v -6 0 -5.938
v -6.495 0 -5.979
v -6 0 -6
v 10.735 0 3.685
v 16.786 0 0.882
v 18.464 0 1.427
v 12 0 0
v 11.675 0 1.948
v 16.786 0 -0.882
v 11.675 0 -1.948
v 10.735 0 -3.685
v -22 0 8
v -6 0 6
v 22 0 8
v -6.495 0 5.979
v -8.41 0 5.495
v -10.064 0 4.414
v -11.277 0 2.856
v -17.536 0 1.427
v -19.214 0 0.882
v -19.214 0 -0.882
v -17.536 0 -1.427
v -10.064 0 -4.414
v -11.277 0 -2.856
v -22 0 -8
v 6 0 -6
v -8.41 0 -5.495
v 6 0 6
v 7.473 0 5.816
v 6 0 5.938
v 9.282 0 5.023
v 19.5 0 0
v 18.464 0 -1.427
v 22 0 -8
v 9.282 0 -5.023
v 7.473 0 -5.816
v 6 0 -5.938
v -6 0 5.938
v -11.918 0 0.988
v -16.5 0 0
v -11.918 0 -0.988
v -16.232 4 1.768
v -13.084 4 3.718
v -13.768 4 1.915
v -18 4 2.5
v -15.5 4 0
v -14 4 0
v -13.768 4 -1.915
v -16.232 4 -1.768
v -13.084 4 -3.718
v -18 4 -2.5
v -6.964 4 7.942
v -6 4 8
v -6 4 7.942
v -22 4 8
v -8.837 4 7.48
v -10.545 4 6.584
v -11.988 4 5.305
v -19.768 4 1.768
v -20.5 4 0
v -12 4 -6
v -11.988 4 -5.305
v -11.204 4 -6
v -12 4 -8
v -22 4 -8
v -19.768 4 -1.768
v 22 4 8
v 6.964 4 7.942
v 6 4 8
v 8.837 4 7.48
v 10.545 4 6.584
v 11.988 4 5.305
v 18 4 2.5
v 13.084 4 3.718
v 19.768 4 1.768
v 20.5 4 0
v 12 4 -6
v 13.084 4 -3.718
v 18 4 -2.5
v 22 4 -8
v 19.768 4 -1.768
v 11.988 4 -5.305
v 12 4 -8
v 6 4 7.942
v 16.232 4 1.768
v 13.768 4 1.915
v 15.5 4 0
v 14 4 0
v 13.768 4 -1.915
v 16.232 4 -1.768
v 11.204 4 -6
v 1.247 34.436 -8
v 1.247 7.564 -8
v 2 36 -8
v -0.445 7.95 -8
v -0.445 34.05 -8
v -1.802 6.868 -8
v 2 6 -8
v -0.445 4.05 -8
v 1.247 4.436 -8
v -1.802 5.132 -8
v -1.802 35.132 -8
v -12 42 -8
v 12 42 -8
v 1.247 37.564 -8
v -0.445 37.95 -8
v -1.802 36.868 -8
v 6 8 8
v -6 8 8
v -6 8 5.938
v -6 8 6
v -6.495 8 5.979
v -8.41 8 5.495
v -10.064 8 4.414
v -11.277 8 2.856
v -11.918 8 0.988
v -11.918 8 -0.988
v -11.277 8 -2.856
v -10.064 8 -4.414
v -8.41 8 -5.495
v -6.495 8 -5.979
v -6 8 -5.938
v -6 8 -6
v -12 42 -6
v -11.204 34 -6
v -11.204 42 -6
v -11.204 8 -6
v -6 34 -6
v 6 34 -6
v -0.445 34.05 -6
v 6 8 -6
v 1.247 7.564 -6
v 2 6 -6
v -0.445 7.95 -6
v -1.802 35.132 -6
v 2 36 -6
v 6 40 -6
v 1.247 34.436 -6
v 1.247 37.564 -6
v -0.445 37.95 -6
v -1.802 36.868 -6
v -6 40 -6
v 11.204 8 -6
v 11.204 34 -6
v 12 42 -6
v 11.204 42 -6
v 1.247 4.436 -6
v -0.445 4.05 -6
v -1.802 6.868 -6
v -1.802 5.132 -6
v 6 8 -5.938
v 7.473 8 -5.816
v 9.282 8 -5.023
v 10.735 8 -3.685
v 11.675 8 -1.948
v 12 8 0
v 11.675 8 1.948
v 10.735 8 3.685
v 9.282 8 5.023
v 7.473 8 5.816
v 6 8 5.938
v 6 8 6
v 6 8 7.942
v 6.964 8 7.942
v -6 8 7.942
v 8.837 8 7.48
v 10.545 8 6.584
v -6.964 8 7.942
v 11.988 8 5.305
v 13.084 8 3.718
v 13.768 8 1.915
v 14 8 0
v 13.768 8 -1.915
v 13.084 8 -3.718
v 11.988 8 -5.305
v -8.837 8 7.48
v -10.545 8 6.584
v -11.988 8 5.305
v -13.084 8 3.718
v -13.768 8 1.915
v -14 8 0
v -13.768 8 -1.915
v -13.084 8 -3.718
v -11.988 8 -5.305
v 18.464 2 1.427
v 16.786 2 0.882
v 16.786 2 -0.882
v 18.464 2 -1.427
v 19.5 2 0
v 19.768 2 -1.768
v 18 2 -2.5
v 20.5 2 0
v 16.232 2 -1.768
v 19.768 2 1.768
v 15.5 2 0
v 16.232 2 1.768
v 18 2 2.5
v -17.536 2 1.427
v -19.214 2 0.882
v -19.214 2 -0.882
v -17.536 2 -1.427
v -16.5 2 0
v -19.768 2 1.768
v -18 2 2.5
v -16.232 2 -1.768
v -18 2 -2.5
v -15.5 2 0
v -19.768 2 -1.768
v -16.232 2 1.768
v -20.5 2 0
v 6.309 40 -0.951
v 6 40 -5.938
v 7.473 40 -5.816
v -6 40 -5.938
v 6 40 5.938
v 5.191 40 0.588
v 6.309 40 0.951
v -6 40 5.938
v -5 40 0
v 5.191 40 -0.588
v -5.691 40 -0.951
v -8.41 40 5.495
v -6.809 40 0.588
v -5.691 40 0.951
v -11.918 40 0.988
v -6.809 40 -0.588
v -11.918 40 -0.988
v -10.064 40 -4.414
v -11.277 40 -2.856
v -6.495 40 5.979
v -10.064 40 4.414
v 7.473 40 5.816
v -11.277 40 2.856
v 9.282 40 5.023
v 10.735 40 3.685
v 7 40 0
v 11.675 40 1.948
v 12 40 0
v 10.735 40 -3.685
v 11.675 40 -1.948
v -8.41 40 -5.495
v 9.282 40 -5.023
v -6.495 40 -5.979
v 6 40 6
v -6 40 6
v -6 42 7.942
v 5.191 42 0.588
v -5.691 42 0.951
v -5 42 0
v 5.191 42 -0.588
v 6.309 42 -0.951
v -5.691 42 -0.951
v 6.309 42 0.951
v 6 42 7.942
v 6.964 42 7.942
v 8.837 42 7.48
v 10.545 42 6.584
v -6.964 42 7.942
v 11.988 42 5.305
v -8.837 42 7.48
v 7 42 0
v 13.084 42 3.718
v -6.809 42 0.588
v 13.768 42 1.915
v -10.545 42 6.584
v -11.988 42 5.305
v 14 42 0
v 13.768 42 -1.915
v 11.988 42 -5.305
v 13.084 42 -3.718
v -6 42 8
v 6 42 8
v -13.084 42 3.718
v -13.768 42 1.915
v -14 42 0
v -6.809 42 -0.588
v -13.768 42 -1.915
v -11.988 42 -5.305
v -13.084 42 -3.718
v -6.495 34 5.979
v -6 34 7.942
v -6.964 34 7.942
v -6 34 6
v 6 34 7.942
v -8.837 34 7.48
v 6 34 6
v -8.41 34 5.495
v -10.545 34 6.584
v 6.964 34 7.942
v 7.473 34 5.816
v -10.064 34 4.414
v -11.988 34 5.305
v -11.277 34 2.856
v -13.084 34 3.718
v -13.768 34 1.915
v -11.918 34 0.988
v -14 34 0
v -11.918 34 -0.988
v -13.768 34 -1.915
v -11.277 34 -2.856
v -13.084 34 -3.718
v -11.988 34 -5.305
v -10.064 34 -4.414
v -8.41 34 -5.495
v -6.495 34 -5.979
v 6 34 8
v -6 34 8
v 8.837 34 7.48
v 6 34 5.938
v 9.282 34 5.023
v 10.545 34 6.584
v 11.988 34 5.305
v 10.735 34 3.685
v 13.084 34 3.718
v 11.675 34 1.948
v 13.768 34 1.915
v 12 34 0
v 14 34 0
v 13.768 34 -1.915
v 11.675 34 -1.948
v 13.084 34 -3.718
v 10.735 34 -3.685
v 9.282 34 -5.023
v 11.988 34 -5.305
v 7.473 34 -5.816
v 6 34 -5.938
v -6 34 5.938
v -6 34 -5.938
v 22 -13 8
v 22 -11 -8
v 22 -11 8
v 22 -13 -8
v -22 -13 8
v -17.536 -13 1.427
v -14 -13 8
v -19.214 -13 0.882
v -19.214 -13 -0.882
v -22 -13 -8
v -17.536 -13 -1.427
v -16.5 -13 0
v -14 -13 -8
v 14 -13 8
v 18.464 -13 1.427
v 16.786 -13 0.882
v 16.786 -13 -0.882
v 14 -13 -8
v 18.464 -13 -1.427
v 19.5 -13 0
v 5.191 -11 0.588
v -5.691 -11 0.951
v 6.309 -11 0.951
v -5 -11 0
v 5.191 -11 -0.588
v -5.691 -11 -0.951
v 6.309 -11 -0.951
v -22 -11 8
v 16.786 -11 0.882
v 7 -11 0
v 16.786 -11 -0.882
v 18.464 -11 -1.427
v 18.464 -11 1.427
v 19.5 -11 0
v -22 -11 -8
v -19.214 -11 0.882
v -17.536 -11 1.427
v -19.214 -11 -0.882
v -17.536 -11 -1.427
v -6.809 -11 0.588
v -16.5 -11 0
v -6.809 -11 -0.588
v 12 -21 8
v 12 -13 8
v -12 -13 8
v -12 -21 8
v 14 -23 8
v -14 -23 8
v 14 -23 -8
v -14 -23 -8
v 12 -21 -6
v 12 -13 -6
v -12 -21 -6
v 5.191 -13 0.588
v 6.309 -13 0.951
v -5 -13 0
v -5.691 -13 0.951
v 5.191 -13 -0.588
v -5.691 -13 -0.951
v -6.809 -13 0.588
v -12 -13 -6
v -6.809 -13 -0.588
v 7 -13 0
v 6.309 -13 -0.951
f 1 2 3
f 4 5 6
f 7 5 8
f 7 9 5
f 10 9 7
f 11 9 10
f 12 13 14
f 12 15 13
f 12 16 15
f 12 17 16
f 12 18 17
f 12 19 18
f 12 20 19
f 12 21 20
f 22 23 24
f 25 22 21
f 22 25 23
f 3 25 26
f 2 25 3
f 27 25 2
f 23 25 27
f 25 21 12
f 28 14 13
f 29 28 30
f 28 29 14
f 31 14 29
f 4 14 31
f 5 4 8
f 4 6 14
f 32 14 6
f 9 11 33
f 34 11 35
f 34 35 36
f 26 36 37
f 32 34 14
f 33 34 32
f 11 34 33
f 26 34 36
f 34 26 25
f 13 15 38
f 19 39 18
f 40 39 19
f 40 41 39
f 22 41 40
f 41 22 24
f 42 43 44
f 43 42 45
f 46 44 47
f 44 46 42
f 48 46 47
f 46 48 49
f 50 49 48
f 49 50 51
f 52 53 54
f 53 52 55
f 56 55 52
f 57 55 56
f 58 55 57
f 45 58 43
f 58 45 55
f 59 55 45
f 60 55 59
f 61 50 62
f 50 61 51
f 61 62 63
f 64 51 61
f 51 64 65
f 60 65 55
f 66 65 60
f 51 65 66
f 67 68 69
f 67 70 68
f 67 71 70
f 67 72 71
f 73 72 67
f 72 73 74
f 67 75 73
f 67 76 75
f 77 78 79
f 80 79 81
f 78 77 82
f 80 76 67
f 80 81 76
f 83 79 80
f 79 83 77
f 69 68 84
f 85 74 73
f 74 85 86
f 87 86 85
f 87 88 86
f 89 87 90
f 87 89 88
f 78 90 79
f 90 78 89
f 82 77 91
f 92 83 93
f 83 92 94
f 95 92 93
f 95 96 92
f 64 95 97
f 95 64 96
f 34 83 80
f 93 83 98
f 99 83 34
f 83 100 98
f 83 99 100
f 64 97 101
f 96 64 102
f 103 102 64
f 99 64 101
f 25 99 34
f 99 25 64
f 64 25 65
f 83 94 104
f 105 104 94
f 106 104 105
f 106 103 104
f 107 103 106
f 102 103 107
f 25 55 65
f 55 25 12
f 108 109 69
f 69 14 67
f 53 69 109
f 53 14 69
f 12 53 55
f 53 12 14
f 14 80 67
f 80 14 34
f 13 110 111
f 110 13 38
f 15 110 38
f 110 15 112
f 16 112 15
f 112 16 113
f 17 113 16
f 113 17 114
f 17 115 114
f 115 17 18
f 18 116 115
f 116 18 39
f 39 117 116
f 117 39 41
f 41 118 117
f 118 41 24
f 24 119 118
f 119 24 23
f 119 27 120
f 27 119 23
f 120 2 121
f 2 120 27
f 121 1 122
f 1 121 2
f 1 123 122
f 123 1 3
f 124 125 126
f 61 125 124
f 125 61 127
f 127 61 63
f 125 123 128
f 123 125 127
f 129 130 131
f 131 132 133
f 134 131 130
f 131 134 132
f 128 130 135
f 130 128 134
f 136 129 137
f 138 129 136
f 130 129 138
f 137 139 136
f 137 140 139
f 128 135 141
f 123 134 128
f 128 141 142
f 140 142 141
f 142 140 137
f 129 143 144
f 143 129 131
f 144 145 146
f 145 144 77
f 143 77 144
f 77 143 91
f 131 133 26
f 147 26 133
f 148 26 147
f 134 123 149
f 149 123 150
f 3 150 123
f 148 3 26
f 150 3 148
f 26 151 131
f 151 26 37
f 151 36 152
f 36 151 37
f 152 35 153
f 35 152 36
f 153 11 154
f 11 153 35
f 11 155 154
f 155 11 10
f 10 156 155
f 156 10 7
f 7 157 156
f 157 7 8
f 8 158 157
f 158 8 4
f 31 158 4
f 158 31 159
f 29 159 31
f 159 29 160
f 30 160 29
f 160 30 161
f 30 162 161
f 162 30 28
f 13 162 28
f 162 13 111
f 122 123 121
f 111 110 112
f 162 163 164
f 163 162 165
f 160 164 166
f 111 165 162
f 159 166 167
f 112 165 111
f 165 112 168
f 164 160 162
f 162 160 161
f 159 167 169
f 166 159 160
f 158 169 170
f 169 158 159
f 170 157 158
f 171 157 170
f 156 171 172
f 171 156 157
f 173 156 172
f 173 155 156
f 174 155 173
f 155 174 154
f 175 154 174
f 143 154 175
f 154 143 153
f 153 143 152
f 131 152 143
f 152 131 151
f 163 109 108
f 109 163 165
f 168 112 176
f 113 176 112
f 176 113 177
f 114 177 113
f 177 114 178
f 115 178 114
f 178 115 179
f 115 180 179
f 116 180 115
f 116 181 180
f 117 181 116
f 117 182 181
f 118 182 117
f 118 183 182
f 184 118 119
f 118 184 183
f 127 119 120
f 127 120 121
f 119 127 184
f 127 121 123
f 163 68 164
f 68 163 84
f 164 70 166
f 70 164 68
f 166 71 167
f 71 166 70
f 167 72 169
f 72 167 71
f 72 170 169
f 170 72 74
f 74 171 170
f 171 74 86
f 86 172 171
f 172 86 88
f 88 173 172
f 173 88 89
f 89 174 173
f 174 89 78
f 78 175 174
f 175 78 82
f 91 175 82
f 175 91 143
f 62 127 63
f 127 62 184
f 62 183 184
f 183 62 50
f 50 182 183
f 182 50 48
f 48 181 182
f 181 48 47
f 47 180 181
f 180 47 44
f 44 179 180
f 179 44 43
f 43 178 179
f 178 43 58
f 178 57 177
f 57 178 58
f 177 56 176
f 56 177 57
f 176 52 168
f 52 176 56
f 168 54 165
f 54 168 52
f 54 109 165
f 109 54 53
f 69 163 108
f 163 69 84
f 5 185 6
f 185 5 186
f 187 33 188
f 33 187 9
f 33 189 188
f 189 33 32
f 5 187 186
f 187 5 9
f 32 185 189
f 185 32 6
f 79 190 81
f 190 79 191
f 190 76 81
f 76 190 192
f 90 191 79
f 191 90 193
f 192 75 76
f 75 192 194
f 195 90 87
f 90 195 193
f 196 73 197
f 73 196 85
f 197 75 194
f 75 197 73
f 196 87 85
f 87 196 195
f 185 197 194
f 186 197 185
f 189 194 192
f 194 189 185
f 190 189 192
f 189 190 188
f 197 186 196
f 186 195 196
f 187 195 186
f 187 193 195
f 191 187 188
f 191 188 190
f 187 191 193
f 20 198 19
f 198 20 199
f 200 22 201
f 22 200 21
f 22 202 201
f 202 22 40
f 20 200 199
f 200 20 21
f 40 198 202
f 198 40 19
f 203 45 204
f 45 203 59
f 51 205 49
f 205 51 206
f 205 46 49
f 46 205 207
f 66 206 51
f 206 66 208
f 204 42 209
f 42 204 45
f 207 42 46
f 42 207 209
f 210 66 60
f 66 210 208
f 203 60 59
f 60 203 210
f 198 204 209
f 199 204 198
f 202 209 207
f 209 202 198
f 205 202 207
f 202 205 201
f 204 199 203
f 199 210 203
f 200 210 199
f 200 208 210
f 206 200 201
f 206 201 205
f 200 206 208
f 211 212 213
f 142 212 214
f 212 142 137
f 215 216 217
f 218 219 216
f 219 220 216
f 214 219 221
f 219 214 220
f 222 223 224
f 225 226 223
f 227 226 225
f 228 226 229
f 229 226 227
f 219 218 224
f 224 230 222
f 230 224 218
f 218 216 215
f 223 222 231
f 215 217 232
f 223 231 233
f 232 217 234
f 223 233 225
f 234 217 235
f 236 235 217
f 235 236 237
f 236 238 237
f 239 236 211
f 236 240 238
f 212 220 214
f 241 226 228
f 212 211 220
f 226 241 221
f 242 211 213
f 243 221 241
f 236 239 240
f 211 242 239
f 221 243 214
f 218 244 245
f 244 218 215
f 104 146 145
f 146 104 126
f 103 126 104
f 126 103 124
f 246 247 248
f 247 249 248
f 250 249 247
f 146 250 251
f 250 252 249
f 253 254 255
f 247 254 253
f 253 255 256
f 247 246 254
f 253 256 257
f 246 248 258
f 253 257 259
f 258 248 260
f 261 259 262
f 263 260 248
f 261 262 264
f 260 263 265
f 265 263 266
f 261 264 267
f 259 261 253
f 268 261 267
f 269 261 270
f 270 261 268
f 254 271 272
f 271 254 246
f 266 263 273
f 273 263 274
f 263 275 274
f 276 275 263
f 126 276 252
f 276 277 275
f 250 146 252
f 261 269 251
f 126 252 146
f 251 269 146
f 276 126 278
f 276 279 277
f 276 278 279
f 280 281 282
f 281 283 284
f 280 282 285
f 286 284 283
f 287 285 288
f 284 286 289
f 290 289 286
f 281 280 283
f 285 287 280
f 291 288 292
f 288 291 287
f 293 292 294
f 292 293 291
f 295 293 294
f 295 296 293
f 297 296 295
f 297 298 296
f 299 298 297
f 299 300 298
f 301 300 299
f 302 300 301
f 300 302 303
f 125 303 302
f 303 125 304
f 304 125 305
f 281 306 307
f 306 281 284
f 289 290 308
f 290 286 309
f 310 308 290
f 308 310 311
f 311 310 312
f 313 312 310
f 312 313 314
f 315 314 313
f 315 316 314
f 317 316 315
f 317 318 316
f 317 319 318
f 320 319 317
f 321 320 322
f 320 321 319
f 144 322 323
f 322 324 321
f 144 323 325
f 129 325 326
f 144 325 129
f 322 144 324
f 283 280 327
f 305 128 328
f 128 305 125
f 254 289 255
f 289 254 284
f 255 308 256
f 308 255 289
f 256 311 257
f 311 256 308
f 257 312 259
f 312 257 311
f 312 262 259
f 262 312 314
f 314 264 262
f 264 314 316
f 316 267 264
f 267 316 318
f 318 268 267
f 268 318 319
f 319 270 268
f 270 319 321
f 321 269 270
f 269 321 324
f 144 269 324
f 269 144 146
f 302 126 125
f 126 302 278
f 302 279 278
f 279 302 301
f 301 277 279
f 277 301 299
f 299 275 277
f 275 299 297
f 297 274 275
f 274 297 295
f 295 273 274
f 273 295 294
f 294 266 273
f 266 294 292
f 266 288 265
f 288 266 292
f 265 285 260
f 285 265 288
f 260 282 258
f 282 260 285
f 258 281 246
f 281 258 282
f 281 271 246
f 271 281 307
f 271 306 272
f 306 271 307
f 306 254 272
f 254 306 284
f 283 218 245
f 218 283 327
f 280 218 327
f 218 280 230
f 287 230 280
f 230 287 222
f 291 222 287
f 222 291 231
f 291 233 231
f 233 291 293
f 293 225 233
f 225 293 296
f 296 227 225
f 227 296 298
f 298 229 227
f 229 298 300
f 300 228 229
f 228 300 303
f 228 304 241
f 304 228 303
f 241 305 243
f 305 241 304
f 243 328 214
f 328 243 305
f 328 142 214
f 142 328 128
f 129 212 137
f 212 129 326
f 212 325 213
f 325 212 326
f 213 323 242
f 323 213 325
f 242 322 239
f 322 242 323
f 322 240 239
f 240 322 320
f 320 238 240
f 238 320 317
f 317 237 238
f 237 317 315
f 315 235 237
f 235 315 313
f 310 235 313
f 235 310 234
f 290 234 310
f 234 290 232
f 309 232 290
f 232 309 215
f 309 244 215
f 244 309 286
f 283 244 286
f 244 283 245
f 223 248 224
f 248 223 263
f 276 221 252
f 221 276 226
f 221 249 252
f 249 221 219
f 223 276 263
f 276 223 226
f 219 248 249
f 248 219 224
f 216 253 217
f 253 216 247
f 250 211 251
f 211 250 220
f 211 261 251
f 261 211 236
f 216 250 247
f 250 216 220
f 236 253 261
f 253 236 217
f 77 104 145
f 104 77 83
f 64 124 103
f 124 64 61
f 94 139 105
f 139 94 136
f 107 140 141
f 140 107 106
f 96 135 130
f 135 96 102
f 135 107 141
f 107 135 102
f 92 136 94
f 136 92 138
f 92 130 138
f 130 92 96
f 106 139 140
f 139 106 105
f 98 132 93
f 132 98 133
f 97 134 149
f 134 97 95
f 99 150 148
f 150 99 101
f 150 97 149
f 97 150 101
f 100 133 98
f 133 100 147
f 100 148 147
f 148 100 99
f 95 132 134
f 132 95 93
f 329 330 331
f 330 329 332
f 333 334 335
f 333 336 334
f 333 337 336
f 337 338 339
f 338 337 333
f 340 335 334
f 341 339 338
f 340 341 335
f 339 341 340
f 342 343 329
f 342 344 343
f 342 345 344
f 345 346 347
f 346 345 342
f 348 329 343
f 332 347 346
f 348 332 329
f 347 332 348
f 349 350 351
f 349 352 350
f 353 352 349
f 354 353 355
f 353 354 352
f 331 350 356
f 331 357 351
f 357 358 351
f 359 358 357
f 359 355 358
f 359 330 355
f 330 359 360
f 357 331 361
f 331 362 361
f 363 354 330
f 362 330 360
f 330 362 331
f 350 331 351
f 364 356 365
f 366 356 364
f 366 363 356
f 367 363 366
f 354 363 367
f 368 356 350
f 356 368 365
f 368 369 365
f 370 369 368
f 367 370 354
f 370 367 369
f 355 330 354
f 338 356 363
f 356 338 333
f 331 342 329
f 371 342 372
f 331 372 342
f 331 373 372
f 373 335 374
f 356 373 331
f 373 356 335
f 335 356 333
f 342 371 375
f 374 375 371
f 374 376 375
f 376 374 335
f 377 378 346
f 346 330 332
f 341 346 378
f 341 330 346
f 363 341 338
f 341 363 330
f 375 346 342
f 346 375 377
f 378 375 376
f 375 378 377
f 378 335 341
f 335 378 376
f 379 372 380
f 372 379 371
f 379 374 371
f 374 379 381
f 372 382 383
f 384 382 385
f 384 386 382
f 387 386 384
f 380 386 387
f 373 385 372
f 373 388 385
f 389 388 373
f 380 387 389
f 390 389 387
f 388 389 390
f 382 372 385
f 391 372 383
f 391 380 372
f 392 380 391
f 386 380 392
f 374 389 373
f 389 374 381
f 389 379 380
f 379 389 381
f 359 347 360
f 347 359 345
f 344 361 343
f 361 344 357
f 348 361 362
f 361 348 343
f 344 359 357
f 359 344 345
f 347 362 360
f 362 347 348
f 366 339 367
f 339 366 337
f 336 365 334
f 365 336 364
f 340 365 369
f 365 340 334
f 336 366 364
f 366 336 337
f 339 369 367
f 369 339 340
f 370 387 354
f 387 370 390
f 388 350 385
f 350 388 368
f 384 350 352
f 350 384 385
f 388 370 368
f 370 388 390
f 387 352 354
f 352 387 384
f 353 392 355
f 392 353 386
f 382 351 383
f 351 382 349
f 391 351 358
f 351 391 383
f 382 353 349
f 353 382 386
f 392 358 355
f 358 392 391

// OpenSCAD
module shape(d){
translate([-d/2,0])circle(d/2);
translate([d/2,0])circle(d/2);
square(d,center=true);
}


module shell_shape(d,t){
    difference() {
       union(){
            translate([-d/2,0])circle(d/2+t);
            translate([d/2,0])circle(d/2+t);
            square([d,d+t+t],center=true);
       }
    translate([-d/2,0])circle(d/2);
    translate([d/2,0])circle(d/2);
    square(d,center=true);
    }
}


module batt_end(d,t,h){
    difference(){
    union(){
    translate([0,0,h-t])linear_extrude(t) shape(d+t);
    linear_extrude(h) shell_shape(d,t);
    }   
          
   //battery connector holes
   translate([-d/2,0,h])cylinder(r=1,h= h, center=true);     
   translate([d/2,0,h])cylinder(r=1,h= h,center=true);  
    }
}

//batt_end(11,2);

module screw_end(d,t,h){
    difference(){
        union(){
        linear_extrude(t+t)
            difference(){
                square([d+d+t+t+h+h,d+t+t],center=true);
                shape(d); //cut out shape
            }
     linear_extrude(8) shell_shape(d,t);
    }
   //drill holes 
   // assume m3 with bolt diam of 5
   translate([d+h-t,0,0])cylinder(r=1.5,h= h+h,center=true); 
   translate([d+h-t,0,t+t])cylinder(r=2.5,h= t+t,center=true,$NA=6); 
   
   translate([-(d+h-t),0,0])cylinder(r=1.5,h= h+h,center=true);     
  translate([-(d+h-t),0,t+t])cylinder(r=2.5,h= t+t,center=true);     
   }
}

module screw_cap(d,t,h){
    difference(){
       union(){
            cube([d+d+t+t+h+h,d+t+t,t],center=true);
            translate([0,0,d/2])cube([d+d+t+t,d+t+t,10],center=true);
       }

   translate([0,t,d/2-t/2])cube([d+h+t+t,d+t+t,8],center=true);
   //drill holes 
   // assume m3 with bolt diam of 5
   translate([d+h-t,0,0])cylinder(r=1.5,h= h+h,center=true); 
   translate([d+h-t,0,t+t])cylinder(r=2.5,h= t+t,center=true,$NA=6); 
   
   translate([-(d+h-t),0,0])cylinder(r=1.5,h= h+h,center=true);     
   translate([-(d+h-t),0,t+t])cylinder(r=2.5,h= t+t,center=true);     
  
   //battery connector holes
   translate([-d/2,0,0])cylinder(r=1,h= t+t, center=true);     
   translate([+d/2,0,0])cylinder(r=1,h= t+t,center=true);     

     
    }
}


module  batt_join(d,t,h,l,sd){
    screw_end(d,t,h);
    translate([0,0,l-h]) batt_end(d,t,h);
    translate([0,d/2+t/2,l/2])cube([d+d,t,l],center=true);
}

module buzzer(d,t,h,l,sd) {
    
difference(){
    batt_join(d,t,h,l);
    translate([0,h,l/2+sd/2])rotate([90,0,0])cylinder(r=2,h=6,center=true);
    translate([0,h,l/2-sd/2])rotate([90,0,0])cylinder(r=2,h=6,center=true);
}
}

rotate([-90,0,0])buzzer(12,2,8,42,30);
translate([0,-12,0])rotate([90,0,0])screw_cap(12,2,8,42,30);
